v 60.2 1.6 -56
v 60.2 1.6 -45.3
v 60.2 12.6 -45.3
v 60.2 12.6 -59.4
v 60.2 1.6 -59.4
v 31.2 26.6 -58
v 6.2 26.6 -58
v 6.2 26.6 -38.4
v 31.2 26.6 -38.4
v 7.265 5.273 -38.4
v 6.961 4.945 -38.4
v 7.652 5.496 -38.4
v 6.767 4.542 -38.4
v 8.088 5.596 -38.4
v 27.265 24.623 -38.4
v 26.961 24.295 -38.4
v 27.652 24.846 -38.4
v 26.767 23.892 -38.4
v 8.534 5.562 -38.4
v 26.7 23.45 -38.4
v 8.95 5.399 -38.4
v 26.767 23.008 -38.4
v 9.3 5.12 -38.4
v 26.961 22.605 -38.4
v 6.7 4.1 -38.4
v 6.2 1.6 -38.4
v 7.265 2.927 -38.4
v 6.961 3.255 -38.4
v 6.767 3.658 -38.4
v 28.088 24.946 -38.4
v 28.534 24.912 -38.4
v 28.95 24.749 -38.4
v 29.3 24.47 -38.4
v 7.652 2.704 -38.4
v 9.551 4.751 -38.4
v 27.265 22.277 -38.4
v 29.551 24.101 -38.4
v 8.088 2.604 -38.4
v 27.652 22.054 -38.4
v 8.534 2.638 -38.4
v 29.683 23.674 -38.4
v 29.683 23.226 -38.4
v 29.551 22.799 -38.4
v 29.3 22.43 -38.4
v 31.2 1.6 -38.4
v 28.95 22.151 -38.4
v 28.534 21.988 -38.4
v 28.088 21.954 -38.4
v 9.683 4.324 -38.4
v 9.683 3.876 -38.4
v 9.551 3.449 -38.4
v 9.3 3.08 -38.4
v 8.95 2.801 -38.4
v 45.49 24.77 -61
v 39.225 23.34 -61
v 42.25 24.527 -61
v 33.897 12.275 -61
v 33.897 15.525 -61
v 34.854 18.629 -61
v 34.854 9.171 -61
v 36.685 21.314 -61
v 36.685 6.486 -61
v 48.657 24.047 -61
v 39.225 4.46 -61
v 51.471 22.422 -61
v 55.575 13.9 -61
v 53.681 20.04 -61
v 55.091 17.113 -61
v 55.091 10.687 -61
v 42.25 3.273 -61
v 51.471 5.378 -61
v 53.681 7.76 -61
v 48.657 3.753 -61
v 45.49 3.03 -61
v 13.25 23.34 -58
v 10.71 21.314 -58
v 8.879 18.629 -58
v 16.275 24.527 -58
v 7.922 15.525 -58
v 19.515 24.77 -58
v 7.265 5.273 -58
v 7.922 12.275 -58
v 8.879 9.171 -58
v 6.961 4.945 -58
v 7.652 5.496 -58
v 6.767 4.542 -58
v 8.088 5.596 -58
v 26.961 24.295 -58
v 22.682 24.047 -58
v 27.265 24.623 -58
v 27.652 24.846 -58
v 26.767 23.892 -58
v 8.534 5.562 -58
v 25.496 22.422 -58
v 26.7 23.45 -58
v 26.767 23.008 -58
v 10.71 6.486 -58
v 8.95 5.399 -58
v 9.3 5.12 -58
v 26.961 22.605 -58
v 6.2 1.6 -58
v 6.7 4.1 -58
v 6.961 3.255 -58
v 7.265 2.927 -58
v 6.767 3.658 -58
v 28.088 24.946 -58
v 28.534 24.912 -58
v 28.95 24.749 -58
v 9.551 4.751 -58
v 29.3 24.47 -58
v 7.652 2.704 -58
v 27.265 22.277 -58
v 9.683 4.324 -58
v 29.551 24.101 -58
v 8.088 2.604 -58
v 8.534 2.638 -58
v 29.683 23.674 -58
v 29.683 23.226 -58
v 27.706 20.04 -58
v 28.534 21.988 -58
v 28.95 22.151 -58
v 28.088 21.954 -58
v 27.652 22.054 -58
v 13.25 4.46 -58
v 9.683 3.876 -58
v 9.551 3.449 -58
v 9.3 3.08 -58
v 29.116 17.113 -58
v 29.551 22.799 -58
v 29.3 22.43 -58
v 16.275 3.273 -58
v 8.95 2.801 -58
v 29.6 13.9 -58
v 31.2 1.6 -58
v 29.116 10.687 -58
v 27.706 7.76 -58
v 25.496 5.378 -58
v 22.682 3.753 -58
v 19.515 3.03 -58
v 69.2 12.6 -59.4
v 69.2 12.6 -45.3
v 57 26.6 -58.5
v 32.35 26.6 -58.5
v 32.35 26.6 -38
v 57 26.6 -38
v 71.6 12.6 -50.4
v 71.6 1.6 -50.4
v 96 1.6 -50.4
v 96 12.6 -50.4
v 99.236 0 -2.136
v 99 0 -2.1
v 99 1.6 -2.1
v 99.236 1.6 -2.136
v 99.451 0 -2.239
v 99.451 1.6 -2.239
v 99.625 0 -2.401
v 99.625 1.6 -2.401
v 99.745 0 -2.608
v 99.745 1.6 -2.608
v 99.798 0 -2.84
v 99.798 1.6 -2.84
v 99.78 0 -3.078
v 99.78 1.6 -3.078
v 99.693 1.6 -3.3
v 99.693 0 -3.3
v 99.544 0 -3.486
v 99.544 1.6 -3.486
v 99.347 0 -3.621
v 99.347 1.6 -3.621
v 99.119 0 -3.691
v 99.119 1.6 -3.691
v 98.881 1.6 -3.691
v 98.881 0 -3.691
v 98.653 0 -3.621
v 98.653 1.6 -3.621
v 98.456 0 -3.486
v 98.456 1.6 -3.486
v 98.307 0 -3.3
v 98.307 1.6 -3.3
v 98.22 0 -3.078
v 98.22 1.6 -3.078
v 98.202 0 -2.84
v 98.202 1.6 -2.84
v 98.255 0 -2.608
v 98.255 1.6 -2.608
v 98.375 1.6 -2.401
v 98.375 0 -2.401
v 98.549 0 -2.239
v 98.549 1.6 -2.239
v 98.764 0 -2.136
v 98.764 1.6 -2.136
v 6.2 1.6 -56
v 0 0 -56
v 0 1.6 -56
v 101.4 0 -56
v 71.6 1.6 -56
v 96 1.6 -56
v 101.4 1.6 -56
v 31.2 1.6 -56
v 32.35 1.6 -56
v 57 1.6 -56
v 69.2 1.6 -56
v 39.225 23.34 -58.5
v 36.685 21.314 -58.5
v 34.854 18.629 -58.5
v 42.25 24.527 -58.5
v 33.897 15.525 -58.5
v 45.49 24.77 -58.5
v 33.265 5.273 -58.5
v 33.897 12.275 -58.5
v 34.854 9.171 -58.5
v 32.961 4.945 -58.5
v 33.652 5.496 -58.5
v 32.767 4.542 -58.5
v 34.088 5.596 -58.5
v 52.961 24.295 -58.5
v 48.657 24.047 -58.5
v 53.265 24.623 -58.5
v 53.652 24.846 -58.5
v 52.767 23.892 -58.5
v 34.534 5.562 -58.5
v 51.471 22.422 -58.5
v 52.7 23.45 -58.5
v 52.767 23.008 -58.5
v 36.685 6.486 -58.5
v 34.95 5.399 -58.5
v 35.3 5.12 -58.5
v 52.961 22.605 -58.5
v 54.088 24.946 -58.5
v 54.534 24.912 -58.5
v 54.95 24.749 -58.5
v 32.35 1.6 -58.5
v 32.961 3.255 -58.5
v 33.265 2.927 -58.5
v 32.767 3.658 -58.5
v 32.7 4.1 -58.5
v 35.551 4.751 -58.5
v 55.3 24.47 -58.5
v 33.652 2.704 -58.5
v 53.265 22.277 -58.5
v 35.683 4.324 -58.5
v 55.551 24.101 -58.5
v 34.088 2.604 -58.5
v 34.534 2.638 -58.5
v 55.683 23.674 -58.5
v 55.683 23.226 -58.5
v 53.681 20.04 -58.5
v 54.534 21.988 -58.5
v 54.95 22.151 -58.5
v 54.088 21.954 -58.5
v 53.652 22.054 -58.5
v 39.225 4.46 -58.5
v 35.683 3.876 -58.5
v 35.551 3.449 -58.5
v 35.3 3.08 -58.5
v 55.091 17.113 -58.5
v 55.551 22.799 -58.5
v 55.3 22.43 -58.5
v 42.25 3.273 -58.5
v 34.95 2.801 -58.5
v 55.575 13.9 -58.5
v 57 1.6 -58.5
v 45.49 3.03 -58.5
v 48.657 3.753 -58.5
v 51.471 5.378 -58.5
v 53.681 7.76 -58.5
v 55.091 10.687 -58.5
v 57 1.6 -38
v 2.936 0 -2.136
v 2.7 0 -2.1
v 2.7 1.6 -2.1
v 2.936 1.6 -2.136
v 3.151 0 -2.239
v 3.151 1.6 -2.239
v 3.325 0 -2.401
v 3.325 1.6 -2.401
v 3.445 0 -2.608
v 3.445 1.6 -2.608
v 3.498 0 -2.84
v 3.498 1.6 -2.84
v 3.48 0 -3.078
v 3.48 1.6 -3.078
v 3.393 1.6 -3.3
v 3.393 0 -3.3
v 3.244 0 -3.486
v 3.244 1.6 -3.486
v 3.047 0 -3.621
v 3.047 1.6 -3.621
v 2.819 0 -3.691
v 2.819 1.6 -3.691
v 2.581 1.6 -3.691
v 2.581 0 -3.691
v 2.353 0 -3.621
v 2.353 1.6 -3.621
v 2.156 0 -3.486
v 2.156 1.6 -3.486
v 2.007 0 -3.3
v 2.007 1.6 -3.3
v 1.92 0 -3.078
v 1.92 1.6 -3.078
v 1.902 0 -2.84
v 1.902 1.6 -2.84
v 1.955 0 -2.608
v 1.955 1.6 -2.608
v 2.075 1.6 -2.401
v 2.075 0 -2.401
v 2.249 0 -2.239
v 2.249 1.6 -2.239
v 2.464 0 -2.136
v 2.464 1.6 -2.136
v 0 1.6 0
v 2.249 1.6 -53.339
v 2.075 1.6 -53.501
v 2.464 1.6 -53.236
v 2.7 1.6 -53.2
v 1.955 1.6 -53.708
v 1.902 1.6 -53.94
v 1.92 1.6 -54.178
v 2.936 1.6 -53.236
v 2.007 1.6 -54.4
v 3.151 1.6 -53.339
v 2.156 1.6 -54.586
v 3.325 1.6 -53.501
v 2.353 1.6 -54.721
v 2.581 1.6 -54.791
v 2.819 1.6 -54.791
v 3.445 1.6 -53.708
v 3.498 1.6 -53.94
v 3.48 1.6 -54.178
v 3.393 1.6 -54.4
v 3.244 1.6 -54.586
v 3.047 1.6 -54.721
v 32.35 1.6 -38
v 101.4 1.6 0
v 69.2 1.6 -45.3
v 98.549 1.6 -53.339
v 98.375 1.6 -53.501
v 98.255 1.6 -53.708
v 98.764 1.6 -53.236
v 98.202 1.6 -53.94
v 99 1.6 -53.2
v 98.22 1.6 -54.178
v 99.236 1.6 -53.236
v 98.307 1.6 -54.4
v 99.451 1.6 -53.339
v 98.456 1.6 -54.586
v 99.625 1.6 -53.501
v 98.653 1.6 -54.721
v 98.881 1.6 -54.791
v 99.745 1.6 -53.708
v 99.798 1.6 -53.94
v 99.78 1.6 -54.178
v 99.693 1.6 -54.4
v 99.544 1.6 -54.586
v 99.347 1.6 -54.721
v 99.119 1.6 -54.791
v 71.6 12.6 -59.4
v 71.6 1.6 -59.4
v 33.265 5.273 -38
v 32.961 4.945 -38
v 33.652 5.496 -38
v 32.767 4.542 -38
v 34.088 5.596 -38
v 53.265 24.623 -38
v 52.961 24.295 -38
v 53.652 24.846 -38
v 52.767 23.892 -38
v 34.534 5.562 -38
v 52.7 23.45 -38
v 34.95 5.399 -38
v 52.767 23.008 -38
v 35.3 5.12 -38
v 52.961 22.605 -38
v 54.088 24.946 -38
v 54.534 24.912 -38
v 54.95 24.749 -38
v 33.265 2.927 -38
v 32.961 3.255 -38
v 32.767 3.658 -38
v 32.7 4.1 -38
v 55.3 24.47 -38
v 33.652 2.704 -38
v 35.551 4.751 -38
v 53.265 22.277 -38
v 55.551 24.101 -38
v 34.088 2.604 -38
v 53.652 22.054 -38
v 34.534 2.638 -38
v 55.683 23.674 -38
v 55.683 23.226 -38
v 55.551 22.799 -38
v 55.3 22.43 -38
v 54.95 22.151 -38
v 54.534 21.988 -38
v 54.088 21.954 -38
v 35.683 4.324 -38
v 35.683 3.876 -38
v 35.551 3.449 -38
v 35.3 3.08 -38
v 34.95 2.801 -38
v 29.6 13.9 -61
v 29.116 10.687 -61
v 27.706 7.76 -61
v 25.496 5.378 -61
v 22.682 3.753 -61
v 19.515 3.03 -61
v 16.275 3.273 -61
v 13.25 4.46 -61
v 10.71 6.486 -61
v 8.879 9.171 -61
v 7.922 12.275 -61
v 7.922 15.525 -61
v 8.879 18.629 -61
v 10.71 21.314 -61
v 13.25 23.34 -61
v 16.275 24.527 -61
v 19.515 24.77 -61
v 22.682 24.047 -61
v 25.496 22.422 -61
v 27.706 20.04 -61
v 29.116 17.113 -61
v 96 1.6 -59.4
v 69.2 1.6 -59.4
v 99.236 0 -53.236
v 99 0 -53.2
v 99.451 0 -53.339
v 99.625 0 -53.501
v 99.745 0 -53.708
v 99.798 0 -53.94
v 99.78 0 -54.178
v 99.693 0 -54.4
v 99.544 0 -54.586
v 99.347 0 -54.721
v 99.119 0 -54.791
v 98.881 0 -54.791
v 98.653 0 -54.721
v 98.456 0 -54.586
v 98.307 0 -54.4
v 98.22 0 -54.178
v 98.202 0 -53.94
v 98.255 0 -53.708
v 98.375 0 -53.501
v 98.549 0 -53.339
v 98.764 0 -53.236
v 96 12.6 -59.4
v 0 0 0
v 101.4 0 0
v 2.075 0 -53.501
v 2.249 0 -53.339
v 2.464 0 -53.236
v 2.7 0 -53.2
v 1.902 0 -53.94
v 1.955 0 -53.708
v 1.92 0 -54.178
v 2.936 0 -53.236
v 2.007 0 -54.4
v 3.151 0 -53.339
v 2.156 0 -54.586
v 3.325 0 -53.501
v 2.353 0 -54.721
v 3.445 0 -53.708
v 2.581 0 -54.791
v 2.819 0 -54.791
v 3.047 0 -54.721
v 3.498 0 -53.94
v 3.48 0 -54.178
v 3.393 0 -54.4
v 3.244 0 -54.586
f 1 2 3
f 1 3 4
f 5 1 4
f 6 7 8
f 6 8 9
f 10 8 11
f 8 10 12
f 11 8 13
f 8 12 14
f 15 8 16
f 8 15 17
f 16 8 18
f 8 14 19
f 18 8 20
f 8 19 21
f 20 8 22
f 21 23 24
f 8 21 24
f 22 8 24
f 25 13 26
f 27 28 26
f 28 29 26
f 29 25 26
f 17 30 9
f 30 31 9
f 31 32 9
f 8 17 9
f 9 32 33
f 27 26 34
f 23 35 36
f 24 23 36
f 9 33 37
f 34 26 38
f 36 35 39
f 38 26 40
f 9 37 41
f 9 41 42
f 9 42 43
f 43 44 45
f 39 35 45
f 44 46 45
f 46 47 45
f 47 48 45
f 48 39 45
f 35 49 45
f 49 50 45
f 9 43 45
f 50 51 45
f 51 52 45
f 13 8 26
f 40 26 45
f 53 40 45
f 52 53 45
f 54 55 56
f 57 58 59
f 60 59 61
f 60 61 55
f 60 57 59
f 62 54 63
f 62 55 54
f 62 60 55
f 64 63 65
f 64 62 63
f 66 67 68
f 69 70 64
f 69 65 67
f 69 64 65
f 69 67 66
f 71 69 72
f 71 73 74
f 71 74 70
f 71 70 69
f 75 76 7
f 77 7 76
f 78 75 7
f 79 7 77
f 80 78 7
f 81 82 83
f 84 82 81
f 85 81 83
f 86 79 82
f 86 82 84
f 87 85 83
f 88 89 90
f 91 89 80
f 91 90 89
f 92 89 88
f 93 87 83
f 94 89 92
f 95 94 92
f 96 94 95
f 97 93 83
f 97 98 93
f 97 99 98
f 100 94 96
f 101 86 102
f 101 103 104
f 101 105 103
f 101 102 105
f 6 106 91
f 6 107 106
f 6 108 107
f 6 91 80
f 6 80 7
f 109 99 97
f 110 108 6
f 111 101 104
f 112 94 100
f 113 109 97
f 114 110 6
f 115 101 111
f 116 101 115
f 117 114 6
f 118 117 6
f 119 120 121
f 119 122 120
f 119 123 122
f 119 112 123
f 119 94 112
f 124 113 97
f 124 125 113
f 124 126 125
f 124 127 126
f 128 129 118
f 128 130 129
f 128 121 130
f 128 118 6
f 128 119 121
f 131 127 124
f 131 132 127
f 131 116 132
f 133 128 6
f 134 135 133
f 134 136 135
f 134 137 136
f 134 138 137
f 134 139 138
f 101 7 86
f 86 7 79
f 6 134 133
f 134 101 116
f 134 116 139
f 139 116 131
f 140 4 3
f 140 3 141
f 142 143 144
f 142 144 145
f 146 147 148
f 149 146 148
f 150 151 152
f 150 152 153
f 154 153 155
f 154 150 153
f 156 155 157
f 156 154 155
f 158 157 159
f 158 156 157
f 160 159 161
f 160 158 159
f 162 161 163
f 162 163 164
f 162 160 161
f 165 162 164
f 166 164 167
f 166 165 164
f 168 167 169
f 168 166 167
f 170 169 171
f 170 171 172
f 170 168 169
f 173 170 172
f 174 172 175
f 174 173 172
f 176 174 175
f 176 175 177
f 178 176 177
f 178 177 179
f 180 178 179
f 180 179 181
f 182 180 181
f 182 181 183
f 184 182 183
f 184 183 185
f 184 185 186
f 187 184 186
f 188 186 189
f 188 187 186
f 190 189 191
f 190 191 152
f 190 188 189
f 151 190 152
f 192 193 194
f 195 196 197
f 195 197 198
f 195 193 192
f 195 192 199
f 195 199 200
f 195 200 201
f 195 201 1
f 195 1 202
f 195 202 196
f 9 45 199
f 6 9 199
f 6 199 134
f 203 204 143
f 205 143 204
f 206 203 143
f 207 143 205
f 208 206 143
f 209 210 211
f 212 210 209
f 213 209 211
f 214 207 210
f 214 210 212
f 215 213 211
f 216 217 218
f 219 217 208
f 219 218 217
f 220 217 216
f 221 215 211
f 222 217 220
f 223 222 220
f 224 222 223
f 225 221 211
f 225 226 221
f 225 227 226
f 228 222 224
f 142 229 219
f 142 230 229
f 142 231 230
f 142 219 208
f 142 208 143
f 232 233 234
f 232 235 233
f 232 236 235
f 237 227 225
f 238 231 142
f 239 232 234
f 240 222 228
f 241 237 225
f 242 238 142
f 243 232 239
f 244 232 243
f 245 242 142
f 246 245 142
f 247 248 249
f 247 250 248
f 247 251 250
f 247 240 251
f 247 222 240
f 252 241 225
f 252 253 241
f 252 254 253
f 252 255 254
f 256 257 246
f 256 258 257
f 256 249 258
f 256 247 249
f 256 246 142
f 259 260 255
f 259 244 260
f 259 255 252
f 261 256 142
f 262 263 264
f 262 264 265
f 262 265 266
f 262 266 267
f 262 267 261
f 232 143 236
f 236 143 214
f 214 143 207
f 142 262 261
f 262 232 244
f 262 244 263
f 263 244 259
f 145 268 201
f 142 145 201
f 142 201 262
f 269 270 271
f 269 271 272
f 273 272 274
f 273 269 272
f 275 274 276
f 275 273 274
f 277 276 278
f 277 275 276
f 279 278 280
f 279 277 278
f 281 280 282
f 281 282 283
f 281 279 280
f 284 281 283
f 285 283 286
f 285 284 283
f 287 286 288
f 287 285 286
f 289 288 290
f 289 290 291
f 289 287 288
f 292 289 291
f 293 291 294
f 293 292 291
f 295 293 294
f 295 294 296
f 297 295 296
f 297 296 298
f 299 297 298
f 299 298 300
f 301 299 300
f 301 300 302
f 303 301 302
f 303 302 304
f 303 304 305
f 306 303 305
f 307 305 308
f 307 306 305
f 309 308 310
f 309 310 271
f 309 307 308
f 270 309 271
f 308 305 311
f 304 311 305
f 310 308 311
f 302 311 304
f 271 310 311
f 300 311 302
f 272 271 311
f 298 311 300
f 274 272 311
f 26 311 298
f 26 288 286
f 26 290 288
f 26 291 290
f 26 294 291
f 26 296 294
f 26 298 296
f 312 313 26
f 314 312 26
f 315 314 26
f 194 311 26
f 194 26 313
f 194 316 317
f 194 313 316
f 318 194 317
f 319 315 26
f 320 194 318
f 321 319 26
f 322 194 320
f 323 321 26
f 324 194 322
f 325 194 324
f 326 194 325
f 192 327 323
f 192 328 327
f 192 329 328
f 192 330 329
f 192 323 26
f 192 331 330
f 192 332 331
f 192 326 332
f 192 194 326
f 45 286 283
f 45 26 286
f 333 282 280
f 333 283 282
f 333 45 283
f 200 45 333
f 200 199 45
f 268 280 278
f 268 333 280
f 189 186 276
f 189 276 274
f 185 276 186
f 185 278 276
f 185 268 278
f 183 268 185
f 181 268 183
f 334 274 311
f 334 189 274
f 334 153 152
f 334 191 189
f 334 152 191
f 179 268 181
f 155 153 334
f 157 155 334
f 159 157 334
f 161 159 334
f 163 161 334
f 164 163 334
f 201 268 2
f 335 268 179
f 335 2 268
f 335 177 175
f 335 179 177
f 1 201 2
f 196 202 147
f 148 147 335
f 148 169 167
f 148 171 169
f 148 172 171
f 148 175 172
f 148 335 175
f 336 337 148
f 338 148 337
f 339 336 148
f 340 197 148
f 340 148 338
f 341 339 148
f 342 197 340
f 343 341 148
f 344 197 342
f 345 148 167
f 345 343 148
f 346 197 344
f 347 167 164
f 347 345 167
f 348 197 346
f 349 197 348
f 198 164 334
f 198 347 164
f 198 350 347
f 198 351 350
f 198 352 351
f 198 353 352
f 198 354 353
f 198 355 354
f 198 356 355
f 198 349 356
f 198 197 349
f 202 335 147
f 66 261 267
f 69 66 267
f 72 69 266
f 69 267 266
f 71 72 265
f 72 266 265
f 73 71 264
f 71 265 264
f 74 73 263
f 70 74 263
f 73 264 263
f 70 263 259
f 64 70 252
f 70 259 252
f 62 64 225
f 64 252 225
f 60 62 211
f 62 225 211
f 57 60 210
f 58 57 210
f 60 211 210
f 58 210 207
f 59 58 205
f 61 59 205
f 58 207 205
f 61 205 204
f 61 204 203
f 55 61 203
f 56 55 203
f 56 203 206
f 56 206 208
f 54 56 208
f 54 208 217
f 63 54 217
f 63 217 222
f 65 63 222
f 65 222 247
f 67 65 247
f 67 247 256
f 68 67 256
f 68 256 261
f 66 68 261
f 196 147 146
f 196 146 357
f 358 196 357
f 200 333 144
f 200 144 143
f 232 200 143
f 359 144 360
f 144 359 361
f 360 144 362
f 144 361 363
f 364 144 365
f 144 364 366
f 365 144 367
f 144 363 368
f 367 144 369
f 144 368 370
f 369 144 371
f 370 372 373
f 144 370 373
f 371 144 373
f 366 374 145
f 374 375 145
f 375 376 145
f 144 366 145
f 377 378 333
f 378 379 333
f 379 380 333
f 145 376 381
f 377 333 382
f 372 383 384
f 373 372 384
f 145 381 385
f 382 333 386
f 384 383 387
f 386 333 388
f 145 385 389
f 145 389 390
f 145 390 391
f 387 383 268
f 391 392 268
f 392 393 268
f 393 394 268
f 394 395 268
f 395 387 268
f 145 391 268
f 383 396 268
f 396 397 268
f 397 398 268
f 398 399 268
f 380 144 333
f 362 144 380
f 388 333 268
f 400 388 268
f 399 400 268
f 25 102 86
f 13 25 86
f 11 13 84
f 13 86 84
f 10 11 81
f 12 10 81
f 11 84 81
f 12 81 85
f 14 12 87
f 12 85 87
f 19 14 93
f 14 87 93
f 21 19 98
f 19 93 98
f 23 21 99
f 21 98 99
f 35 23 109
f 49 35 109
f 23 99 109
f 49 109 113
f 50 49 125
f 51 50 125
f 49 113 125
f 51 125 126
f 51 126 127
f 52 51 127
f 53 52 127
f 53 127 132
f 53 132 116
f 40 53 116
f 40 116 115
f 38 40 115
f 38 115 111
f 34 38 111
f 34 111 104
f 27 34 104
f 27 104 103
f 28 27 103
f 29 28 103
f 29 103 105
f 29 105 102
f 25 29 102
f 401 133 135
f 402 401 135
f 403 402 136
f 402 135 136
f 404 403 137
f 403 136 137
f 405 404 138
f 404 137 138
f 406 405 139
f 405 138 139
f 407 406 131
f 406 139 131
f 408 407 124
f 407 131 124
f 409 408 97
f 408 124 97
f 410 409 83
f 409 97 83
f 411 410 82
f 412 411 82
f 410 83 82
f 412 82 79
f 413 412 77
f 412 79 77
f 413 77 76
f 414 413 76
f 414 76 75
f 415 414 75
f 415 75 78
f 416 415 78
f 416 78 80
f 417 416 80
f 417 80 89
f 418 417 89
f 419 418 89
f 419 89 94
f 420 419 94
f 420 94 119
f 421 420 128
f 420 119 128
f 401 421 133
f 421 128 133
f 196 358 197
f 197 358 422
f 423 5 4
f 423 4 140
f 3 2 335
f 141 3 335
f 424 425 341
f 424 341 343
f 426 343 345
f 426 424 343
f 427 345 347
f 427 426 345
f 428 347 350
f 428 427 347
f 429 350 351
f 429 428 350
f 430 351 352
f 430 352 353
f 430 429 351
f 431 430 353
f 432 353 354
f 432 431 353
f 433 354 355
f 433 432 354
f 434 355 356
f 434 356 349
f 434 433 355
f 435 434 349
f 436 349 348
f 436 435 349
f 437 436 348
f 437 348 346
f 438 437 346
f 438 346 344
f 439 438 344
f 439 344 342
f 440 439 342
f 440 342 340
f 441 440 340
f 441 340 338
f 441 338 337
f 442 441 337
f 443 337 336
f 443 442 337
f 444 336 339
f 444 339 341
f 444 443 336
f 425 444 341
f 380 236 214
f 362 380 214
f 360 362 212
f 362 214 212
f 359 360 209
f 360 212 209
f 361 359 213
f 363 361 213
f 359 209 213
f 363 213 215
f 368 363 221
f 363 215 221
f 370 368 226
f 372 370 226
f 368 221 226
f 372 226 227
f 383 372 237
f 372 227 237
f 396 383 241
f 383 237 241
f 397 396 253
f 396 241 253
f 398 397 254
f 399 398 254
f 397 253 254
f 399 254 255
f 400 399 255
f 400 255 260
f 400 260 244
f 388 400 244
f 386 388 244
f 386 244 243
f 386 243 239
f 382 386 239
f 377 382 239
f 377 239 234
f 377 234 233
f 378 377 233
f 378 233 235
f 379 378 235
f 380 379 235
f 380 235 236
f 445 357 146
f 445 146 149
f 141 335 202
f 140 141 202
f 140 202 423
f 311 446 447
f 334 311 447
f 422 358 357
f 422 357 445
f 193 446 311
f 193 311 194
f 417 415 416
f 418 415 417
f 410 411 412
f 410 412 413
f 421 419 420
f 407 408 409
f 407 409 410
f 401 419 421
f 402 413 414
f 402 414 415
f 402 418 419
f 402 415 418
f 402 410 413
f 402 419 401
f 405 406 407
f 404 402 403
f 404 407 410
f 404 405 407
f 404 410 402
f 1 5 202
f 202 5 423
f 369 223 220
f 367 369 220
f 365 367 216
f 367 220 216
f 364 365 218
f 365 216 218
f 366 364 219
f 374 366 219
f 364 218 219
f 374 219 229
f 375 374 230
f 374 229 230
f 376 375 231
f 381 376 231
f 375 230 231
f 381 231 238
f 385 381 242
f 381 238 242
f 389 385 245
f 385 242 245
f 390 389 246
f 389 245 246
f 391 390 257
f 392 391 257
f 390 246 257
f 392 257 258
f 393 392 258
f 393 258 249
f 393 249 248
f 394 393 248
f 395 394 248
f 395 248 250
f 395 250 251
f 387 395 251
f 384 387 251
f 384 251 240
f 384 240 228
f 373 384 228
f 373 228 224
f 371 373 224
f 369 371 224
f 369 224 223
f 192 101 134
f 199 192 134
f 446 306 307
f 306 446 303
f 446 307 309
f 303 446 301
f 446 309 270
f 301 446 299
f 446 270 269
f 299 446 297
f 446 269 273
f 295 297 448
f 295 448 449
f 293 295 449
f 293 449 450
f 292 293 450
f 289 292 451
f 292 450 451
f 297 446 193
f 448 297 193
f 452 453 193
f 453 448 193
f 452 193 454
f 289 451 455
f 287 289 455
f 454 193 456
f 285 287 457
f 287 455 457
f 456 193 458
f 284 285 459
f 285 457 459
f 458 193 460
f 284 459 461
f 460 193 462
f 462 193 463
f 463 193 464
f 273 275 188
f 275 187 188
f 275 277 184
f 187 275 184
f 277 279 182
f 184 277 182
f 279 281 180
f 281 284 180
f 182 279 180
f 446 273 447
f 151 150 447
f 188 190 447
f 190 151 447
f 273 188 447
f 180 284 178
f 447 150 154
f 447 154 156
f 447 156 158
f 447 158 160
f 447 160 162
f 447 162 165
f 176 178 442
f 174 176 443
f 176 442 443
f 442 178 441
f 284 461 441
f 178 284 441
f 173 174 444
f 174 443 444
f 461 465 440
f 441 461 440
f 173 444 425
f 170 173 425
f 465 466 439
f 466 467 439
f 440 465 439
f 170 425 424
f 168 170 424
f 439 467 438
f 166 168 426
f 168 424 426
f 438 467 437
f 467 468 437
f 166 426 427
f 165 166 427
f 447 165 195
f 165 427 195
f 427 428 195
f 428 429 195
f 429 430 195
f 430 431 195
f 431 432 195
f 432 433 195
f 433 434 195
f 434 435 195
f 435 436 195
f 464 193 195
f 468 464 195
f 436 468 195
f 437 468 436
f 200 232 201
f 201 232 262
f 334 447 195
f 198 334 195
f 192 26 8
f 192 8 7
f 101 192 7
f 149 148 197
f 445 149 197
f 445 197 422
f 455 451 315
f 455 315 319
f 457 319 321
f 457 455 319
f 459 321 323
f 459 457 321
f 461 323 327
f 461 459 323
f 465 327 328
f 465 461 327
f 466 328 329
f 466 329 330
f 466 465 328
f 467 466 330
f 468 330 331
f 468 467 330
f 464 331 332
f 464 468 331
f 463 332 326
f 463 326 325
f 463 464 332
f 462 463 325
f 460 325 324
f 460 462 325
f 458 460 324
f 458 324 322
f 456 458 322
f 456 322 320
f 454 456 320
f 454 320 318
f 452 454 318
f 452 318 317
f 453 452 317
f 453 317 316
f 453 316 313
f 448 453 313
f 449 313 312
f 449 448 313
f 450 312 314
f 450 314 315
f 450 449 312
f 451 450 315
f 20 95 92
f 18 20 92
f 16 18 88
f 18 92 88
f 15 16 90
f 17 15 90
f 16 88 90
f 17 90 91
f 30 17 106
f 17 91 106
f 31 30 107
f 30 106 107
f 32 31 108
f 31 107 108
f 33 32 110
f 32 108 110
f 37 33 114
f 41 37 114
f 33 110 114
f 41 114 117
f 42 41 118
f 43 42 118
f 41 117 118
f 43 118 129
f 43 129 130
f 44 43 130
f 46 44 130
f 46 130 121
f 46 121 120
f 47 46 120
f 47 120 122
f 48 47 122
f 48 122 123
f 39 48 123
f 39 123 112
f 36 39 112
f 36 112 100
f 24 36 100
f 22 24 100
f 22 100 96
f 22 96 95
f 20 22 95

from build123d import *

# Parameters (mm, degrees)
SKETCH1_W           = 101.4
SKETCH1_H           = 56
SKETCH1_R           = 0.8
BOSS_EXTRUDE1_DEPTH = 1.6
SKETCH2_W           = 25
SKETCH2_H           = 19.6
SKETCH2_W_2         = 24.65
SKETCH2_H_2         = 20.5
BOSS_EXTRUDE2_DEPTH = 25
SKETCH3_R           = 1.5
CUT_EXTRUDE1_DEPTH  = 121.04903165
SKETCH4_R           = 10.9
BOSS_EXTRUDE3_DEPTH = 3
SKETCH5_W           = 9
SKETCH5_H           = 14.1
SKETCH5_W_2         = 24.4
SKETCH5_H_2         = 9
BOSS_EXTRUDE4_DEPTH = 11


with BuildPart() as part:
    # Sketch1 → Boss-Extrude1 (new body)
    with BuildSketch(Plane(origin=(0, 0, 0), x_dir=(1, 0, 0), z_dir=(0, 1, 0))):
        with Locations((50.7, 28)):
            Rectangle(SKETCH1_W, SKETCH1_H)
        with Locations(Location((2.7, 54, 0), (0, 0, 270))):
            Circle(SKETCH1_R, mode=Mode.SUBTRACT)
        with Locations(Location((2.7, 2.9, 0), (0, 0, 270))):
            Circle(SKETCH1_R, mode=Mode.SUBTRACT)
        with Locations(Location((99, 2.9, 0), (0, 0, 270))):
            Circle(SKETCH1_R, mode=Mode.SUBTRACT)
        with Locations(Location((99, 54, 0), (0, 0, 270))):
            Circle(SKETCH1_R, mode=Mode.SUBTRACT)
    extrude(amount=BOSS_EXTRUDE1_DEPTH)

    # Sketch2 → Boss-Extrude2 (add)
    with BuildSketch(Plane(origin=(0, 1.6, 0), x_dir=(1, 0, 0), z_dir=(0, 1, 0))):
        with Locations((18.7, 48.2)):
            Rectangle(SKETCH2_W, SKETCH2_H)
        with Locations((44.675, 48.25)):
            Rectangle(SKETCH2_W_2, SKETCH2_H_2)
    extrude(amount=BOSS_EXTRUDE2_DEPTH)

    # Sketch3 → Cut-Extrude1 (cut, through all)
    with BuildSketch(Plane(origin=(0, 0, -58.5), x_dir=(-1, 0, 0), z_dir=(0, 0, -1))):
        with Locations((-54.2, 23.45)):
            Circle(SKETCH3_R)
        with Locations((-34.2, 4.1)):
            Circle(SKETCH3_R)
        with Locations((-28.2, 23.45)):
            Circle(SKETCH3_R)
        with Locations((-8.2, 4.1)):
            Circle(SKETCH3_R)
    extrude(amount=-CUT_EXTRUDE1_DEPTH, mode=Mode.SUBTRACT)

    # Sketch4 → Boss-Extrude3 (add)
    with BuildSketch(Plane(origin=(0, 0, -58), x_dir=(-1, 0, 0), z_dir=(0, 0, -1))):
        with Locations(Location((-18.7, 13.9, 0), (0, 0, 180))):
            Circle(SKETCH4_R)
        with Locations(Location((-44.675, 13.9, 0), (0, 0, 180))):
            Circle(SKETCH4_R)
    extrude(amount=BOSS_EXTRUDE3_DEPTH)

    # Sketch5 → Boss-Extrude4 (add)
    with BuildSketch(Plane(origin=(0, 1.6, 0), x_dir=(1, 0, 0), z_dir=(0, 1, 0))):
        with Locations((64.7, 52.35)):
            Rectangle(SKETCH5_W, SKETCH5_H)
        with Locations((83.8, 54.9)):
            Rectangle(SKETCH5_W_2, SKETCH5_H_2)
    extrude(amount=BOSS_EXTRUDE4_DEPTH)


solid = part.part
